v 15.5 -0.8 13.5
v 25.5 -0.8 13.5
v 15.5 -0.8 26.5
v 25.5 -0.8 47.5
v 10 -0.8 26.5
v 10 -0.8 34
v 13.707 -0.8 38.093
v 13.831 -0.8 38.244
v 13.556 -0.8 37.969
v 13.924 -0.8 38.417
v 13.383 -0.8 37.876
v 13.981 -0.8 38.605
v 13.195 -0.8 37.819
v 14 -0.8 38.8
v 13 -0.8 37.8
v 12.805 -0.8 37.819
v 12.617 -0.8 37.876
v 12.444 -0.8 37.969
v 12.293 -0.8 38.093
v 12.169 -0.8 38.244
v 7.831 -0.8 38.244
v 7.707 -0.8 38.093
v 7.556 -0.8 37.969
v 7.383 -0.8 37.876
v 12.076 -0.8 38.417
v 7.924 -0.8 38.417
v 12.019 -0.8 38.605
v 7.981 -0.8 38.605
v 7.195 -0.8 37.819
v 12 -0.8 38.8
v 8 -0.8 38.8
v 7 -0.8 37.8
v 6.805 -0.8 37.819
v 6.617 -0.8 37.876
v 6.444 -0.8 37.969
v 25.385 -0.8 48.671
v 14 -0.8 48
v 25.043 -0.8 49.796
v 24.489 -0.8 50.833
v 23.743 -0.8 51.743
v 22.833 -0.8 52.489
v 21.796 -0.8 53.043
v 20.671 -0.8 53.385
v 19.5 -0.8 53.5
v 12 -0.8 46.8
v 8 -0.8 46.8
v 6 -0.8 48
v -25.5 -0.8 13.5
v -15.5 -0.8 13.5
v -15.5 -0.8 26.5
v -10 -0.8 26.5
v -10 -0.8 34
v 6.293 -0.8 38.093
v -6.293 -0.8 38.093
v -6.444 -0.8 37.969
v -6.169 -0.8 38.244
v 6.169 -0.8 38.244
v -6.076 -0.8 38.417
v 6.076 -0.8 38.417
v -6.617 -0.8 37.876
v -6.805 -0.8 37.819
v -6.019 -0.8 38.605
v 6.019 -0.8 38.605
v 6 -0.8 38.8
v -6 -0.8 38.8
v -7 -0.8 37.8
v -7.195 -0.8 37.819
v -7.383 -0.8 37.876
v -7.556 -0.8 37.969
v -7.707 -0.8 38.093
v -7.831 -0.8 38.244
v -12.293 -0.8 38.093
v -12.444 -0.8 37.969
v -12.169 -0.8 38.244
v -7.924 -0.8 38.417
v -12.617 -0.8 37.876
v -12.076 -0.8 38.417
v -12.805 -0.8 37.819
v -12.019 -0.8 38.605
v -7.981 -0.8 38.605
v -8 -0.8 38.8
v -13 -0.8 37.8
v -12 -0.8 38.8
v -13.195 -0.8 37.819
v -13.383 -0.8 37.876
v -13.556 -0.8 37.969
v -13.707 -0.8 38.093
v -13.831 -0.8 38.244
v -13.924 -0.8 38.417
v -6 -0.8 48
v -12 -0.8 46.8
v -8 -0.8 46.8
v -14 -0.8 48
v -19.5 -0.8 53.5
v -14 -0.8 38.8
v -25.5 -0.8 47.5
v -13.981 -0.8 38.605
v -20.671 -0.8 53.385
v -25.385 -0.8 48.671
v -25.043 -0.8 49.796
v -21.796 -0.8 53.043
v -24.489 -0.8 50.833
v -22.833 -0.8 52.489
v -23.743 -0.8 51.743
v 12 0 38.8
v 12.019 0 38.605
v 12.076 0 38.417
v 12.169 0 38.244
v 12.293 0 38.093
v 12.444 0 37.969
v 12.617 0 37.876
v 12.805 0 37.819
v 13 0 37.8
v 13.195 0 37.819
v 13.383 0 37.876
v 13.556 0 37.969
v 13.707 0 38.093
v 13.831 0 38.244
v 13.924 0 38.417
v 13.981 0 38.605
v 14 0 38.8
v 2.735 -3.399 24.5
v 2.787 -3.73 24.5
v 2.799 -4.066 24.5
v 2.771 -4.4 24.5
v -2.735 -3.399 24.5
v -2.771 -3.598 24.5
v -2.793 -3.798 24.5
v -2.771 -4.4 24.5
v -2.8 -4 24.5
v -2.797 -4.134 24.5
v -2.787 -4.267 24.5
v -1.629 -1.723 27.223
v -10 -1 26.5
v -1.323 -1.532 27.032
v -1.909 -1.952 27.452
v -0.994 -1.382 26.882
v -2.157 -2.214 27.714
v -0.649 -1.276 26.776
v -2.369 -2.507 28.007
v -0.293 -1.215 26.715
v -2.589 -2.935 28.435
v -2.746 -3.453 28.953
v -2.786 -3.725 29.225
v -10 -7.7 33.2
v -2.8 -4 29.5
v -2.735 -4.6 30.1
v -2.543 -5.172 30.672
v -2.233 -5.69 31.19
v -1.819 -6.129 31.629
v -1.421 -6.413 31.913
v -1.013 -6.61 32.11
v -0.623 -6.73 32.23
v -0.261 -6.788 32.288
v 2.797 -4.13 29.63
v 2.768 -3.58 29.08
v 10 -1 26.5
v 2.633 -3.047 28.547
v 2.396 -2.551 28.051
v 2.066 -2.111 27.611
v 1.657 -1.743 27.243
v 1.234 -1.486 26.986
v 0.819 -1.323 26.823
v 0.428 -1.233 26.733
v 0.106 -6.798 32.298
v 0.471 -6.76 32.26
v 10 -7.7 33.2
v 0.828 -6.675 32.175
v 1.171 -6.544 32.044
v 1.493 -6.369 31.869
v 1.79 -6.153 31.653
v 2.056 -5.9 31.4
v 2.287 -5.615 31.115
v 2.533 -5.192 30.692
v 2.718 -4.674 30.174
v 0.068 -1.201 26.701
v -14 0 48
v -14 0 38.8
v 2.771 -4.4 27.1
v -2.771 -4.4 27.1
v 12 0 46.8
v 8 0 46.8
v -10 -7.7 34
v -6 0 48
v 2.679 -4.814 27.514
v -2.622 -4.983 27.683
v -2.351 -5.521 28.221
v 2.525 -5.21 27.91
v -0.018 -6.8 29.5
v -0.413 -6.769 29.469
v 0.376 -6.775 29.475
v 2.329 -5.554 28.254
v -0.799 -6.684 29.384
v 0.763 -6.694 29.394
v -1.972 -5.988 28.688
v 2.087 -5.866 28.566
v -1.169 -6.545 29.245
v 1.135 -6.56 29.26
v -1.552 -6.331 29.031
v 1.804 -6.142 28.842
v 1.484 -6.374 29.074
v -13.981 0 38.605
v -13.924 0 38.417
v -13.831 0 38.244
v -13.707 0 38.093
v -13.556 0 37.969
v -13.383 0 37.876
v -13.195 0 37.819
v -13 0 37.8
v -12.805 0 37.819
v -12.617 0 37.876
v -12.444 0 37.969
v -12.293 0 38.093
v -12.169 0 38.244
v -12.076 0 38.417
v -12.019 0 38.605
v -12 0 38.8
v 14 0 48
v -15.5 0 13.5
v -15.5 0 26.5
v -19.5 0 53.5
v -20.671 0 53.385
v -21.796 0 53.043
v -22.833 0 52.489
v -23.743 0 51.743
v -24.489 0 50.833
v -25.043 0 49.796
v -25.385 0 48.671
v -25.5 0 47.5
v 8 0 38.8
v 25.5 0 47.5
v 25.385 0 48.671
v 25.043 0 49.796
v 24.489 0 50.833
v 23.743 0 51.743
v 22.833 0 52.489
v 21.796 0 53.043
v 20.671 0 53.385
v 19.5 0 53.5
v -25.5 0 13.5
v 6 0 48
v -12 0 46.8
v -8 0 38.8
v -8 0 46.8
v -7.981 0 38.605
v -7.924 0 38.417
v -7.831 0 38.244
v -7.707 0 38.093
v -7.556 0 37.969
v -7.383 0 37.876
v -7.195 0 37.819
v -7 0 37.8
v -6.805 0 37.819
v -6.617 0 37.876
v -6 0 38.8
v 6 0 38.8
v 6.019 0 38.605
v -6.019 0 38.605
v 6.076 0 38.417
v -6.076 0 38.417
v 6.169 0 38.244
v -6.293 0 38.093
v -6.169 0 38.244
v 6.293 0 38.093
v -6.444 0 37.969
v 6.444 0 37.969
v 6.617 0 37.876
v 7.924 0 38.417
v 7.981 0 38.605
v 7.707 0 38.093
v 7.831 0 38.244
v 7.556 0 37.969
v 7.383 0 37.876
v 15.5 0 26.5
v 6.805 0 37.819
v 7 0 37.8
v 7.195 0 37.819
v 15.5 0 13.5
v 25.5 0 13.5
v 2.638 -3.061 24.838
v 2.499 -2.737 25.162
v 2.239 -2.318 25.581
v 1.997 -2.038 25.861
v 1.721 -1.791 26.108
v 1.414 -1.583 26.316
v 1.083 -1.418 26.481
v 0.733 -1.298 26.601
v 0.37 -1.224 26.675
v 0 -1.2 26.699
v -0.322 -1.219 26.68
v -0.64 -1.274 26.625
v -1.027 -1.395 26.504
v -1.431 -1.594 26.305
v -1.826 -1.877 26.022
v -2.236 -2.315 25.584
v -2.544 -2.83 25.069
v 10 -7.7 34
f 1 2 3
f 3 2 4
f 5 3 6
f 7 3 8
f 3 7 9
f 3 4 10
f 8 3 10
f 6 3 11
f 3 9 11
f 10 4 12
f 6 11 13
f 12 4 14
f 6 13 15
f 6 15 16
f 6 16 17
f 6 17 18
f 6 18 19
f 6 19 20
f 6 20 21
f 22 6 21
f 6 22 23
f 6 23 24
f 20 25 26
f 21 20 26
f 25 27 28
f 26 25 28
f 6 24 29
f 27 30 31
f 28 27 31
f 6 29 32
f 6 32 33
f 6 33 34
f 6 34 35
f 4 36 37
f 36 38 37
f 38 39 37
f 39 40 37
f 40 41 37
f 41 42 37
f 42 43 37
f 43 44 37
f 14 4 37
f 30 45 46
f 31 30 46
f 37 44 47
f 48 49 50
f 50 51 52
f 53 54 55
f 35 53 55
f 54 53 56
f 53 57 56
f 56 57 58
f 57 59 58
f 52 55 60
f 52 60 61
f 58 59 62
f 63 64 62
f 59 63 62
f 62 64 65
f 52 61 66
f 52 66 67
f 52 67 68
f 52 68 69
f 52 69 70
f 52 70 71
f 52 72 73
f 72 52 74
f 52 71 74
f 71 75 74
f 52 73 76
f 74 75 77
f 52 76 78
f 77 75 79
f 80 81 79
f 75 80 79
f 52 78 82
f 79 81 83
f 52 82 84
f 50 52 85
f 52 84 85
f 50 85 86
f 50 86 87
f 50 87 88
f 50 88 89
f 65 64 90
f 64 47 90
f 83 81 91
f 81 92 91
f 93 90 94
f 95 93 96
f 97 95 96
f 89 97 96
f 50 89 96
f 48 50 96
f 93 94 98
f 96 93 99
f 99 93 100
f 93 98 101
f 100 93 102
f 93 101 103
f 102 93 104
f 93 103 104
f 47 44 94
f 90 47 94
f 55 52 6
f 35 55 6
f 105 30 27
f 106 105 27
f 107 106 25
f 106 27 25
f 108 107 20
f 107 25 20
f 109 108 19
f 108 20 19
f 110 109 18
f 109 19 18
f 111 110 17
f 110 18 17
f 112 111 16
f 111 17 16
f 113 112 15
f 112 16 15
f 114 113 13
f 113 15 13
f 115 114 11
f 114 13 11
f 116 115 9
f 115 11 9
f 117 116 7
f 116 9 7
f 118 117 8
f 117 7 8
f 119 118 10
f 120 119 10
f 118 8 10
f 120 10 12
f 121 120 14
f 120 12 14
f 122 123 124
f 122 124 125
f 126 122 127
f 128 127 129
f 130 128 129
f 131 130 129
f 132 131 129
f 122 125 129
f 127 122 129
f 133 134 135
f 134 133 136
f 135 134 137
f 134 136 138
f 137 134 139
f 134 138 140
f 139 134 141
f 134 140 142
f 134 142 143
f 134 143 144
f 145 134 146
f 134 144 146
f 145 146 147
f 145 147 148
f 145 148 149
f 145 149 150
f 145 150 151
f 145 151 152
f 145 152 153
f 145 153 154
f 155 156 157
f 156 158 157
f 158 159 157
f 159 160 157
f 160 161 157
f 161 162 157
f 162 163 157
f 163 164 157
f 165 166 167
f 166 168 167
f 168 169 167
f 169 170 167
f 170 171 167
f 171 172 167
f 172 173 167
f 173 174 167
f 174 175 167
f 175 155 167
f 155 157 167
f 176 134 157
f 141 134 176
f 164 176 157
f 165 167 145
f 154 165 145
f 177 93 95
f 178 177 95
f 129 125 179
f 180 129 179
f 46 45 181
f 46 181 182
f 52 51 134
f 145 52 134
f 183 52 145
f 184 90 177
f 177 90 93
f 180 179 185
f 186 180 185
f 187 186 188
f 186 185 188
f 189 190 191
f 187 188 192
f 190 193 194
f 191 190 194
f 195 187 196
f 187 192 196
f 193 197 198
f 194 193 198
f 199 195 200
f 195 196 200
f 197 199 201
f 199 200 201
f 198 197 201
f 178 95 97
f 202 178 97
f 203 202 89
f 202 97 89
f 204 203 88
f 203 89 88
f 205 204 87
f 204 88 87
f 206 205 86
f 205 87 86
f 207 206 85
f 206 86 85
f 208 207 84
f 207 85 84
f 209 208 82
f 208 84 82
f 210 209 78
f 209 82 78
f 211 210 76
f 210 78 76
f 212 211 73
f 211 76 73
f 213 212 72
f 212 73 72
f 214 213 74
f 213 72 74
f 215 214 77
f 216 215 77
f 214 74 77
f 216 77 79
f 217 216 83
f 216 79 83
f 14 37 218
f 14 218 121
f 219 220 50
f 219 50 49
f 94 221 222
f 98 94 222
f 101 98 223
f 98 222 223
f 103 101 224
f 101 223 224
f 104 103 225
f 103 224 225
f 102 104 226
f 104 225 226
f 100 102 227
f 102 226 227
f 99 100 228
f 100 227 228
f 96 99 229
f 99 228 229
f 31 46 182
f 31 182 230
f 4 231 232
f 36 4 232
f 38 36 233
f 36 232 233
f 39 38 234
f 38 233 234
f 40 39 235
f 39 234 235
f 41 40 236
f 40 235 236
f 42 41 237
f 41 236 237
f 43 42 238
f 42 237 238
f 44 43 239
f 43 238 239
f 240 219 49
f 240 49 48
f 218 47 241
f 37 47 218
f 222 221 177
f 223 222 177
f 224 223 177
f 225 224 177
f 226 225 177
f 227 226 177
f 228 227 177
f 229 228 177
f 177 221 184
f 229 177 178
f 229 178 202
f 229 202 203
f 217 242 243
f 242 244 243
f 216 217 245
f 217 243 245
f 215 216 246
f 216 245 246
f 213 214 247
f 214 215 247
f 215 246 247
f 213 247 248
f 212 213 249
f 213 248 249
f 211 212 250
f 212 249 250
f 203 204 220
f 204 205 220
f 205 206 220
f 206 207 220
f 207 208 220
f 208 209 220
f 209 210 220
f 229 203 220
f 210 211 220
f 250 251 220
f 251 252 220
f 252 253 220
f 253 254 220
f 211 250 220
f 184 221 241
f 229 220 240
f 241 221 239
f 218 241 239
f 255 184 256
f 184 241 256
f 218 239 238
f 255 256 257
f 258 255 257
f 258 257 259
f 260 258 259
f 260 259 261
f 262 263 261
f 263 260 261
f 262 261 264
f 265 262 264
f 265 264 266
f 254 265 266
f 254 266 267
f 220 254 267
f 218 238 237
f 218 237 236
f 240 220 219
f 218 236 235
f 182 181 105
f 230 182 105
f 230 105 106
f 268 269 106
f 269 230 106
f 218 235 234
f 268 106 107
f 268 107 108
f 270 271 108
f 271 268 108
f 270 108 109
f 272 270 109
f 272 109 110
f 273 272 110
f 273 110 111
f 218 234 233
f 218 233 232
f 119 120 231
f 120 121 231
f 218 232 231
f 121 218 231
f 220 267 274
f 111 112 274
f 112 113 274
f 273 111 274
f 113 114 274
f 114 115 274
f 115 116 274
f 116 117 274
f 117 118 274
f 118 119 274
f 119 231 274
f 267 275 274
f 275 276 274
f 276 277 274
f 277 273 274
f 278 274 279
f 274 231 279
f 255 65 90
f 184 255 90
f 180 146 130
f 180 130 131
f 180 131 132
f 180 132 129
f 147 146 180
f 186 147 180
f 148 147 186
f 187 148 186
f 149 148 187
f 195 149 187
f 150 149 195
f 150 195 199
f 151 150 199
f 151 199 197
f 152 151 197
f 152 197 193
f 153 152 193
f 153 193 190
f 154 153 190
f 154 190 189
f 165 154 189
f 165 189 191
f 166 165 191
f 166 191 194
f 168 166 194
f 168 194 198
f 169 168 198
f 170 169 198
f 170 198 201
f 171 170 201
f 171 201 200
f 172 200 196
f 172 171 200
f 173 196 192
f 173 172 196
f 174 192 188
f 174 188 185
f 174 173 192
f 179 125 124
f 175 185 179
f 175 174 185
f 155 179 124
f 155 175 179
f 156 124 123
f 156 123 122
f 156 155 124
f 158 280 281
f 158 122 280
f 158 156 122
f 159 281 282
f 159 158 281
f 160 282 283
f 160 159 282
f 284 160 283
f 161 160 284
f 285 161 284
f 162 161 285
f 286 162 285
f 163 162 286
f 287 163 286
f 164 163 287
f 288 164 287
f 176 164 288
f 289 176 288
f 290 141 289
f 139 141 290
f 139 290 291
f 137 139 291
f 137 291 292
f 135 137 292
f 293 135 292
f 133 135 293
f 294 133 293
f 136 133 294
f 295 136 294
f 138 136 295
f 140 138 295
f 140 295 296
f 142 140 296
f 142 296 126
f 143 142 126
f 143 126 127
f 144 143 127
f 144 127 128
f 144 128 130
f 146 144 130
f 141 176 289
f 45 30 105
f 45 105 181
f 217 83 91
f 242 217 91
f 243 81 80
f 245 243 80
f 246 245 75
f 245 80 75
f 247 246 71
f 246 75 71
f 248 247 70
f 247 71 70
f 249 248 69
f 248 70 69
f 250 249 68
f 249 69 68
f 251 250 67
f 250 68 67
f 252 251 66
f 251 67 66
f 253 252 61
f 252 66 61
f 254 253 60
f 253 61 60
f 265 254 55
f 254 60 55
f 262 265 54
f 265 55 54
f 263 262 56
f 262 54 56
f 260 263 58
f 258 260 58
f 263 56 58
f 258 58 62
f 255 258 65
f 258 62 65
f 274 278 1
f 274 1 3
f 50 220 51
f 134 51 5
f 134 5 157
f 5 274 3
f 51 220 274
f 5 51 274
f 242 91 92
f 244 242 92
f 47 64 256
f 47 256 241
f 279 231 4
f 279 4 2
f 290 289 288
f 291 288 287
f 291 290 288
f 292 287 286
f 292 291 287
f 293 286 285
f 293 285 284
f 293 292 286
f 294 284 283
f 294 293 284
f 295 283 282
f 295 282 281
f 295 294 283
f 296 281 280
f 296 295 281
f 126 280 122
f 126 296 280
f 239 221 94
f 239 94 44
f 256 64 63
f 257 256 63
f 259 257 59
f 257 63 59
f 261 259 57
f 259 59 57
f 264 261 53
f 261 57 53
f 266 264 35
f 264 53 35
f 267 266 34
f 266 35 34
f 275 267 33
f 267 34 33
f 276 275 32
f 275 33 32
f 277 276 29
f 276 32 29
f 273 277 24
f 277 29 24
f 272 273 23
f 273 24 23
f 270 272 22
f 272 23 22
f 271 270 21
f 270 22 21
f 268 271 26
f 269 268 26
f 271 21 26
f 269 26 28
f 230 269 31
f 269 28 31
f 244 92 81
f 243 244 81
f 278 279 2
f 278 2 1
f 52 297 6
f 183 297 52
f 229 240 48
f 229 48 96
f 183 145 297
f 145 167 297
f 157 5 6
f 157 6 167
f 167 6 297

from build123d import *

# Parameters (mm, degrees)
PAD_DEPTH       = 0.8
PAD001_DEPTH    = 10
SKETCH003_R     = 2.8
PAD002_DEPTH    = 9.5
POCKET001_DEPTH = 3
POCKET_DEPTH    = 5


with BuildPart() as part:
    # Sketch → Pad (new body)
    with BuildSketch(Plane.XZ):
        with BuildLine():
            Line((-25.5, 13.5), (-25.5, 47.5))
            ThreePointArc((-19.5, 53.5), (-23.742641, 51.742641), (-25.5, 47.5))
            Line((-19.5, 53.5), (19.5, 53.5))
            ThreePointArc((25.5, 47.5), (23.742641, 51.742641), (19.5, 53.5))
            Line((25.5, 47.5), (25.5, 13.5))
            Line((25.5, 13.5), (15.5, 13.5))
            Line((15.5, 13.5), (15.5, 26.5))
            Line((15.5, 26.5), (-15.5, 26.5))
            Line((-15.5, 26.5), (-15.5, 13.5))
            Line((-15.5, 13.5), (-25.5, 13.5))
        make_face()
    extrude(amount=PAD_DEPTH)

    # Sketch001 → Pad001 (join, symmetric)
    with BuildSketch(Plane.YZ):
        Polygon((-1, 26.5), (-7.7, 33.2), (-7.7, 34), (0, 34), (0, 26.5), align=None)
    extrude(amount=PAD001_DEPTH, both=True)

    # Sketch003 (on Face12 of Pad001) → Pad002 (join)
    with BuildSketch(Plane(origin=(0, 0, 34), x_dir=(-1, 0, 0), z_dir=(0, 0, 1))):
        with Locations((0, 4)):
            Circle(SKETCH003_R)
    extrude(amount=-PAD002_DEPTH)

    # Sketch004 → Pocket001 (cut, symmetric)
    with BuildSketch(Plane.YZ):
        Polygon((-1.2, 26.699), (-3.399, 24.5), (-1.2, 24.5), align=None)
        Polygon((-7.7, 30.4), (-7.7, 24.5), (-4.4, 24.5), (-4.4, 27.1), align=None)
    extrude(amount=POCKET001_DEPTH, both=True, mode=Mode.SUBTRACT)

    # Sketch005 (on Face5 of Pad002) → Pocket (cut)
    with BuildSketch(Plane.XZ.offset(0.8)):
        with BuildLine():
            Line((-12, 38.8), (-12, 46.8))
            Line((-12, 46.8), (-8, 46.8))
            Line((-8, 46.8), (-8, 38.8))
            ThreePointArc((-8, 38.8), (-7, 37.8), (-6, 38.8))
            Line((-6, 38.8), (-6, 48))
            Line((-6, 48), (-14, 48))
            Line((-14, 48), (-14, 38.8))
            ThreePointArc((-14, 38.8), (-13, 37.8), (-12, 38.8))
        make_face()
        with BuildLine():
            Line((12, 38.8), (12, 46.8))
            Line((12, 46.8), (8, 46.8))
            Line((8, 46.8), (8, 38.8))
            ThreePointArc((6, 38.8), (7, 37.8), (8, 38.8))
            Line((6, 38.8), (6, 48))
            Line((6, 48), (14, 48))
            Line((14, 48), (14, 38.8))
            ThreePointArc((12, 38.8), (13, 37.8), (14, 38.8))
        make_face()
    extrude(amount=-POCKET_DEPTH, mode=Mode.SUBTRACT)


solid = part.part
